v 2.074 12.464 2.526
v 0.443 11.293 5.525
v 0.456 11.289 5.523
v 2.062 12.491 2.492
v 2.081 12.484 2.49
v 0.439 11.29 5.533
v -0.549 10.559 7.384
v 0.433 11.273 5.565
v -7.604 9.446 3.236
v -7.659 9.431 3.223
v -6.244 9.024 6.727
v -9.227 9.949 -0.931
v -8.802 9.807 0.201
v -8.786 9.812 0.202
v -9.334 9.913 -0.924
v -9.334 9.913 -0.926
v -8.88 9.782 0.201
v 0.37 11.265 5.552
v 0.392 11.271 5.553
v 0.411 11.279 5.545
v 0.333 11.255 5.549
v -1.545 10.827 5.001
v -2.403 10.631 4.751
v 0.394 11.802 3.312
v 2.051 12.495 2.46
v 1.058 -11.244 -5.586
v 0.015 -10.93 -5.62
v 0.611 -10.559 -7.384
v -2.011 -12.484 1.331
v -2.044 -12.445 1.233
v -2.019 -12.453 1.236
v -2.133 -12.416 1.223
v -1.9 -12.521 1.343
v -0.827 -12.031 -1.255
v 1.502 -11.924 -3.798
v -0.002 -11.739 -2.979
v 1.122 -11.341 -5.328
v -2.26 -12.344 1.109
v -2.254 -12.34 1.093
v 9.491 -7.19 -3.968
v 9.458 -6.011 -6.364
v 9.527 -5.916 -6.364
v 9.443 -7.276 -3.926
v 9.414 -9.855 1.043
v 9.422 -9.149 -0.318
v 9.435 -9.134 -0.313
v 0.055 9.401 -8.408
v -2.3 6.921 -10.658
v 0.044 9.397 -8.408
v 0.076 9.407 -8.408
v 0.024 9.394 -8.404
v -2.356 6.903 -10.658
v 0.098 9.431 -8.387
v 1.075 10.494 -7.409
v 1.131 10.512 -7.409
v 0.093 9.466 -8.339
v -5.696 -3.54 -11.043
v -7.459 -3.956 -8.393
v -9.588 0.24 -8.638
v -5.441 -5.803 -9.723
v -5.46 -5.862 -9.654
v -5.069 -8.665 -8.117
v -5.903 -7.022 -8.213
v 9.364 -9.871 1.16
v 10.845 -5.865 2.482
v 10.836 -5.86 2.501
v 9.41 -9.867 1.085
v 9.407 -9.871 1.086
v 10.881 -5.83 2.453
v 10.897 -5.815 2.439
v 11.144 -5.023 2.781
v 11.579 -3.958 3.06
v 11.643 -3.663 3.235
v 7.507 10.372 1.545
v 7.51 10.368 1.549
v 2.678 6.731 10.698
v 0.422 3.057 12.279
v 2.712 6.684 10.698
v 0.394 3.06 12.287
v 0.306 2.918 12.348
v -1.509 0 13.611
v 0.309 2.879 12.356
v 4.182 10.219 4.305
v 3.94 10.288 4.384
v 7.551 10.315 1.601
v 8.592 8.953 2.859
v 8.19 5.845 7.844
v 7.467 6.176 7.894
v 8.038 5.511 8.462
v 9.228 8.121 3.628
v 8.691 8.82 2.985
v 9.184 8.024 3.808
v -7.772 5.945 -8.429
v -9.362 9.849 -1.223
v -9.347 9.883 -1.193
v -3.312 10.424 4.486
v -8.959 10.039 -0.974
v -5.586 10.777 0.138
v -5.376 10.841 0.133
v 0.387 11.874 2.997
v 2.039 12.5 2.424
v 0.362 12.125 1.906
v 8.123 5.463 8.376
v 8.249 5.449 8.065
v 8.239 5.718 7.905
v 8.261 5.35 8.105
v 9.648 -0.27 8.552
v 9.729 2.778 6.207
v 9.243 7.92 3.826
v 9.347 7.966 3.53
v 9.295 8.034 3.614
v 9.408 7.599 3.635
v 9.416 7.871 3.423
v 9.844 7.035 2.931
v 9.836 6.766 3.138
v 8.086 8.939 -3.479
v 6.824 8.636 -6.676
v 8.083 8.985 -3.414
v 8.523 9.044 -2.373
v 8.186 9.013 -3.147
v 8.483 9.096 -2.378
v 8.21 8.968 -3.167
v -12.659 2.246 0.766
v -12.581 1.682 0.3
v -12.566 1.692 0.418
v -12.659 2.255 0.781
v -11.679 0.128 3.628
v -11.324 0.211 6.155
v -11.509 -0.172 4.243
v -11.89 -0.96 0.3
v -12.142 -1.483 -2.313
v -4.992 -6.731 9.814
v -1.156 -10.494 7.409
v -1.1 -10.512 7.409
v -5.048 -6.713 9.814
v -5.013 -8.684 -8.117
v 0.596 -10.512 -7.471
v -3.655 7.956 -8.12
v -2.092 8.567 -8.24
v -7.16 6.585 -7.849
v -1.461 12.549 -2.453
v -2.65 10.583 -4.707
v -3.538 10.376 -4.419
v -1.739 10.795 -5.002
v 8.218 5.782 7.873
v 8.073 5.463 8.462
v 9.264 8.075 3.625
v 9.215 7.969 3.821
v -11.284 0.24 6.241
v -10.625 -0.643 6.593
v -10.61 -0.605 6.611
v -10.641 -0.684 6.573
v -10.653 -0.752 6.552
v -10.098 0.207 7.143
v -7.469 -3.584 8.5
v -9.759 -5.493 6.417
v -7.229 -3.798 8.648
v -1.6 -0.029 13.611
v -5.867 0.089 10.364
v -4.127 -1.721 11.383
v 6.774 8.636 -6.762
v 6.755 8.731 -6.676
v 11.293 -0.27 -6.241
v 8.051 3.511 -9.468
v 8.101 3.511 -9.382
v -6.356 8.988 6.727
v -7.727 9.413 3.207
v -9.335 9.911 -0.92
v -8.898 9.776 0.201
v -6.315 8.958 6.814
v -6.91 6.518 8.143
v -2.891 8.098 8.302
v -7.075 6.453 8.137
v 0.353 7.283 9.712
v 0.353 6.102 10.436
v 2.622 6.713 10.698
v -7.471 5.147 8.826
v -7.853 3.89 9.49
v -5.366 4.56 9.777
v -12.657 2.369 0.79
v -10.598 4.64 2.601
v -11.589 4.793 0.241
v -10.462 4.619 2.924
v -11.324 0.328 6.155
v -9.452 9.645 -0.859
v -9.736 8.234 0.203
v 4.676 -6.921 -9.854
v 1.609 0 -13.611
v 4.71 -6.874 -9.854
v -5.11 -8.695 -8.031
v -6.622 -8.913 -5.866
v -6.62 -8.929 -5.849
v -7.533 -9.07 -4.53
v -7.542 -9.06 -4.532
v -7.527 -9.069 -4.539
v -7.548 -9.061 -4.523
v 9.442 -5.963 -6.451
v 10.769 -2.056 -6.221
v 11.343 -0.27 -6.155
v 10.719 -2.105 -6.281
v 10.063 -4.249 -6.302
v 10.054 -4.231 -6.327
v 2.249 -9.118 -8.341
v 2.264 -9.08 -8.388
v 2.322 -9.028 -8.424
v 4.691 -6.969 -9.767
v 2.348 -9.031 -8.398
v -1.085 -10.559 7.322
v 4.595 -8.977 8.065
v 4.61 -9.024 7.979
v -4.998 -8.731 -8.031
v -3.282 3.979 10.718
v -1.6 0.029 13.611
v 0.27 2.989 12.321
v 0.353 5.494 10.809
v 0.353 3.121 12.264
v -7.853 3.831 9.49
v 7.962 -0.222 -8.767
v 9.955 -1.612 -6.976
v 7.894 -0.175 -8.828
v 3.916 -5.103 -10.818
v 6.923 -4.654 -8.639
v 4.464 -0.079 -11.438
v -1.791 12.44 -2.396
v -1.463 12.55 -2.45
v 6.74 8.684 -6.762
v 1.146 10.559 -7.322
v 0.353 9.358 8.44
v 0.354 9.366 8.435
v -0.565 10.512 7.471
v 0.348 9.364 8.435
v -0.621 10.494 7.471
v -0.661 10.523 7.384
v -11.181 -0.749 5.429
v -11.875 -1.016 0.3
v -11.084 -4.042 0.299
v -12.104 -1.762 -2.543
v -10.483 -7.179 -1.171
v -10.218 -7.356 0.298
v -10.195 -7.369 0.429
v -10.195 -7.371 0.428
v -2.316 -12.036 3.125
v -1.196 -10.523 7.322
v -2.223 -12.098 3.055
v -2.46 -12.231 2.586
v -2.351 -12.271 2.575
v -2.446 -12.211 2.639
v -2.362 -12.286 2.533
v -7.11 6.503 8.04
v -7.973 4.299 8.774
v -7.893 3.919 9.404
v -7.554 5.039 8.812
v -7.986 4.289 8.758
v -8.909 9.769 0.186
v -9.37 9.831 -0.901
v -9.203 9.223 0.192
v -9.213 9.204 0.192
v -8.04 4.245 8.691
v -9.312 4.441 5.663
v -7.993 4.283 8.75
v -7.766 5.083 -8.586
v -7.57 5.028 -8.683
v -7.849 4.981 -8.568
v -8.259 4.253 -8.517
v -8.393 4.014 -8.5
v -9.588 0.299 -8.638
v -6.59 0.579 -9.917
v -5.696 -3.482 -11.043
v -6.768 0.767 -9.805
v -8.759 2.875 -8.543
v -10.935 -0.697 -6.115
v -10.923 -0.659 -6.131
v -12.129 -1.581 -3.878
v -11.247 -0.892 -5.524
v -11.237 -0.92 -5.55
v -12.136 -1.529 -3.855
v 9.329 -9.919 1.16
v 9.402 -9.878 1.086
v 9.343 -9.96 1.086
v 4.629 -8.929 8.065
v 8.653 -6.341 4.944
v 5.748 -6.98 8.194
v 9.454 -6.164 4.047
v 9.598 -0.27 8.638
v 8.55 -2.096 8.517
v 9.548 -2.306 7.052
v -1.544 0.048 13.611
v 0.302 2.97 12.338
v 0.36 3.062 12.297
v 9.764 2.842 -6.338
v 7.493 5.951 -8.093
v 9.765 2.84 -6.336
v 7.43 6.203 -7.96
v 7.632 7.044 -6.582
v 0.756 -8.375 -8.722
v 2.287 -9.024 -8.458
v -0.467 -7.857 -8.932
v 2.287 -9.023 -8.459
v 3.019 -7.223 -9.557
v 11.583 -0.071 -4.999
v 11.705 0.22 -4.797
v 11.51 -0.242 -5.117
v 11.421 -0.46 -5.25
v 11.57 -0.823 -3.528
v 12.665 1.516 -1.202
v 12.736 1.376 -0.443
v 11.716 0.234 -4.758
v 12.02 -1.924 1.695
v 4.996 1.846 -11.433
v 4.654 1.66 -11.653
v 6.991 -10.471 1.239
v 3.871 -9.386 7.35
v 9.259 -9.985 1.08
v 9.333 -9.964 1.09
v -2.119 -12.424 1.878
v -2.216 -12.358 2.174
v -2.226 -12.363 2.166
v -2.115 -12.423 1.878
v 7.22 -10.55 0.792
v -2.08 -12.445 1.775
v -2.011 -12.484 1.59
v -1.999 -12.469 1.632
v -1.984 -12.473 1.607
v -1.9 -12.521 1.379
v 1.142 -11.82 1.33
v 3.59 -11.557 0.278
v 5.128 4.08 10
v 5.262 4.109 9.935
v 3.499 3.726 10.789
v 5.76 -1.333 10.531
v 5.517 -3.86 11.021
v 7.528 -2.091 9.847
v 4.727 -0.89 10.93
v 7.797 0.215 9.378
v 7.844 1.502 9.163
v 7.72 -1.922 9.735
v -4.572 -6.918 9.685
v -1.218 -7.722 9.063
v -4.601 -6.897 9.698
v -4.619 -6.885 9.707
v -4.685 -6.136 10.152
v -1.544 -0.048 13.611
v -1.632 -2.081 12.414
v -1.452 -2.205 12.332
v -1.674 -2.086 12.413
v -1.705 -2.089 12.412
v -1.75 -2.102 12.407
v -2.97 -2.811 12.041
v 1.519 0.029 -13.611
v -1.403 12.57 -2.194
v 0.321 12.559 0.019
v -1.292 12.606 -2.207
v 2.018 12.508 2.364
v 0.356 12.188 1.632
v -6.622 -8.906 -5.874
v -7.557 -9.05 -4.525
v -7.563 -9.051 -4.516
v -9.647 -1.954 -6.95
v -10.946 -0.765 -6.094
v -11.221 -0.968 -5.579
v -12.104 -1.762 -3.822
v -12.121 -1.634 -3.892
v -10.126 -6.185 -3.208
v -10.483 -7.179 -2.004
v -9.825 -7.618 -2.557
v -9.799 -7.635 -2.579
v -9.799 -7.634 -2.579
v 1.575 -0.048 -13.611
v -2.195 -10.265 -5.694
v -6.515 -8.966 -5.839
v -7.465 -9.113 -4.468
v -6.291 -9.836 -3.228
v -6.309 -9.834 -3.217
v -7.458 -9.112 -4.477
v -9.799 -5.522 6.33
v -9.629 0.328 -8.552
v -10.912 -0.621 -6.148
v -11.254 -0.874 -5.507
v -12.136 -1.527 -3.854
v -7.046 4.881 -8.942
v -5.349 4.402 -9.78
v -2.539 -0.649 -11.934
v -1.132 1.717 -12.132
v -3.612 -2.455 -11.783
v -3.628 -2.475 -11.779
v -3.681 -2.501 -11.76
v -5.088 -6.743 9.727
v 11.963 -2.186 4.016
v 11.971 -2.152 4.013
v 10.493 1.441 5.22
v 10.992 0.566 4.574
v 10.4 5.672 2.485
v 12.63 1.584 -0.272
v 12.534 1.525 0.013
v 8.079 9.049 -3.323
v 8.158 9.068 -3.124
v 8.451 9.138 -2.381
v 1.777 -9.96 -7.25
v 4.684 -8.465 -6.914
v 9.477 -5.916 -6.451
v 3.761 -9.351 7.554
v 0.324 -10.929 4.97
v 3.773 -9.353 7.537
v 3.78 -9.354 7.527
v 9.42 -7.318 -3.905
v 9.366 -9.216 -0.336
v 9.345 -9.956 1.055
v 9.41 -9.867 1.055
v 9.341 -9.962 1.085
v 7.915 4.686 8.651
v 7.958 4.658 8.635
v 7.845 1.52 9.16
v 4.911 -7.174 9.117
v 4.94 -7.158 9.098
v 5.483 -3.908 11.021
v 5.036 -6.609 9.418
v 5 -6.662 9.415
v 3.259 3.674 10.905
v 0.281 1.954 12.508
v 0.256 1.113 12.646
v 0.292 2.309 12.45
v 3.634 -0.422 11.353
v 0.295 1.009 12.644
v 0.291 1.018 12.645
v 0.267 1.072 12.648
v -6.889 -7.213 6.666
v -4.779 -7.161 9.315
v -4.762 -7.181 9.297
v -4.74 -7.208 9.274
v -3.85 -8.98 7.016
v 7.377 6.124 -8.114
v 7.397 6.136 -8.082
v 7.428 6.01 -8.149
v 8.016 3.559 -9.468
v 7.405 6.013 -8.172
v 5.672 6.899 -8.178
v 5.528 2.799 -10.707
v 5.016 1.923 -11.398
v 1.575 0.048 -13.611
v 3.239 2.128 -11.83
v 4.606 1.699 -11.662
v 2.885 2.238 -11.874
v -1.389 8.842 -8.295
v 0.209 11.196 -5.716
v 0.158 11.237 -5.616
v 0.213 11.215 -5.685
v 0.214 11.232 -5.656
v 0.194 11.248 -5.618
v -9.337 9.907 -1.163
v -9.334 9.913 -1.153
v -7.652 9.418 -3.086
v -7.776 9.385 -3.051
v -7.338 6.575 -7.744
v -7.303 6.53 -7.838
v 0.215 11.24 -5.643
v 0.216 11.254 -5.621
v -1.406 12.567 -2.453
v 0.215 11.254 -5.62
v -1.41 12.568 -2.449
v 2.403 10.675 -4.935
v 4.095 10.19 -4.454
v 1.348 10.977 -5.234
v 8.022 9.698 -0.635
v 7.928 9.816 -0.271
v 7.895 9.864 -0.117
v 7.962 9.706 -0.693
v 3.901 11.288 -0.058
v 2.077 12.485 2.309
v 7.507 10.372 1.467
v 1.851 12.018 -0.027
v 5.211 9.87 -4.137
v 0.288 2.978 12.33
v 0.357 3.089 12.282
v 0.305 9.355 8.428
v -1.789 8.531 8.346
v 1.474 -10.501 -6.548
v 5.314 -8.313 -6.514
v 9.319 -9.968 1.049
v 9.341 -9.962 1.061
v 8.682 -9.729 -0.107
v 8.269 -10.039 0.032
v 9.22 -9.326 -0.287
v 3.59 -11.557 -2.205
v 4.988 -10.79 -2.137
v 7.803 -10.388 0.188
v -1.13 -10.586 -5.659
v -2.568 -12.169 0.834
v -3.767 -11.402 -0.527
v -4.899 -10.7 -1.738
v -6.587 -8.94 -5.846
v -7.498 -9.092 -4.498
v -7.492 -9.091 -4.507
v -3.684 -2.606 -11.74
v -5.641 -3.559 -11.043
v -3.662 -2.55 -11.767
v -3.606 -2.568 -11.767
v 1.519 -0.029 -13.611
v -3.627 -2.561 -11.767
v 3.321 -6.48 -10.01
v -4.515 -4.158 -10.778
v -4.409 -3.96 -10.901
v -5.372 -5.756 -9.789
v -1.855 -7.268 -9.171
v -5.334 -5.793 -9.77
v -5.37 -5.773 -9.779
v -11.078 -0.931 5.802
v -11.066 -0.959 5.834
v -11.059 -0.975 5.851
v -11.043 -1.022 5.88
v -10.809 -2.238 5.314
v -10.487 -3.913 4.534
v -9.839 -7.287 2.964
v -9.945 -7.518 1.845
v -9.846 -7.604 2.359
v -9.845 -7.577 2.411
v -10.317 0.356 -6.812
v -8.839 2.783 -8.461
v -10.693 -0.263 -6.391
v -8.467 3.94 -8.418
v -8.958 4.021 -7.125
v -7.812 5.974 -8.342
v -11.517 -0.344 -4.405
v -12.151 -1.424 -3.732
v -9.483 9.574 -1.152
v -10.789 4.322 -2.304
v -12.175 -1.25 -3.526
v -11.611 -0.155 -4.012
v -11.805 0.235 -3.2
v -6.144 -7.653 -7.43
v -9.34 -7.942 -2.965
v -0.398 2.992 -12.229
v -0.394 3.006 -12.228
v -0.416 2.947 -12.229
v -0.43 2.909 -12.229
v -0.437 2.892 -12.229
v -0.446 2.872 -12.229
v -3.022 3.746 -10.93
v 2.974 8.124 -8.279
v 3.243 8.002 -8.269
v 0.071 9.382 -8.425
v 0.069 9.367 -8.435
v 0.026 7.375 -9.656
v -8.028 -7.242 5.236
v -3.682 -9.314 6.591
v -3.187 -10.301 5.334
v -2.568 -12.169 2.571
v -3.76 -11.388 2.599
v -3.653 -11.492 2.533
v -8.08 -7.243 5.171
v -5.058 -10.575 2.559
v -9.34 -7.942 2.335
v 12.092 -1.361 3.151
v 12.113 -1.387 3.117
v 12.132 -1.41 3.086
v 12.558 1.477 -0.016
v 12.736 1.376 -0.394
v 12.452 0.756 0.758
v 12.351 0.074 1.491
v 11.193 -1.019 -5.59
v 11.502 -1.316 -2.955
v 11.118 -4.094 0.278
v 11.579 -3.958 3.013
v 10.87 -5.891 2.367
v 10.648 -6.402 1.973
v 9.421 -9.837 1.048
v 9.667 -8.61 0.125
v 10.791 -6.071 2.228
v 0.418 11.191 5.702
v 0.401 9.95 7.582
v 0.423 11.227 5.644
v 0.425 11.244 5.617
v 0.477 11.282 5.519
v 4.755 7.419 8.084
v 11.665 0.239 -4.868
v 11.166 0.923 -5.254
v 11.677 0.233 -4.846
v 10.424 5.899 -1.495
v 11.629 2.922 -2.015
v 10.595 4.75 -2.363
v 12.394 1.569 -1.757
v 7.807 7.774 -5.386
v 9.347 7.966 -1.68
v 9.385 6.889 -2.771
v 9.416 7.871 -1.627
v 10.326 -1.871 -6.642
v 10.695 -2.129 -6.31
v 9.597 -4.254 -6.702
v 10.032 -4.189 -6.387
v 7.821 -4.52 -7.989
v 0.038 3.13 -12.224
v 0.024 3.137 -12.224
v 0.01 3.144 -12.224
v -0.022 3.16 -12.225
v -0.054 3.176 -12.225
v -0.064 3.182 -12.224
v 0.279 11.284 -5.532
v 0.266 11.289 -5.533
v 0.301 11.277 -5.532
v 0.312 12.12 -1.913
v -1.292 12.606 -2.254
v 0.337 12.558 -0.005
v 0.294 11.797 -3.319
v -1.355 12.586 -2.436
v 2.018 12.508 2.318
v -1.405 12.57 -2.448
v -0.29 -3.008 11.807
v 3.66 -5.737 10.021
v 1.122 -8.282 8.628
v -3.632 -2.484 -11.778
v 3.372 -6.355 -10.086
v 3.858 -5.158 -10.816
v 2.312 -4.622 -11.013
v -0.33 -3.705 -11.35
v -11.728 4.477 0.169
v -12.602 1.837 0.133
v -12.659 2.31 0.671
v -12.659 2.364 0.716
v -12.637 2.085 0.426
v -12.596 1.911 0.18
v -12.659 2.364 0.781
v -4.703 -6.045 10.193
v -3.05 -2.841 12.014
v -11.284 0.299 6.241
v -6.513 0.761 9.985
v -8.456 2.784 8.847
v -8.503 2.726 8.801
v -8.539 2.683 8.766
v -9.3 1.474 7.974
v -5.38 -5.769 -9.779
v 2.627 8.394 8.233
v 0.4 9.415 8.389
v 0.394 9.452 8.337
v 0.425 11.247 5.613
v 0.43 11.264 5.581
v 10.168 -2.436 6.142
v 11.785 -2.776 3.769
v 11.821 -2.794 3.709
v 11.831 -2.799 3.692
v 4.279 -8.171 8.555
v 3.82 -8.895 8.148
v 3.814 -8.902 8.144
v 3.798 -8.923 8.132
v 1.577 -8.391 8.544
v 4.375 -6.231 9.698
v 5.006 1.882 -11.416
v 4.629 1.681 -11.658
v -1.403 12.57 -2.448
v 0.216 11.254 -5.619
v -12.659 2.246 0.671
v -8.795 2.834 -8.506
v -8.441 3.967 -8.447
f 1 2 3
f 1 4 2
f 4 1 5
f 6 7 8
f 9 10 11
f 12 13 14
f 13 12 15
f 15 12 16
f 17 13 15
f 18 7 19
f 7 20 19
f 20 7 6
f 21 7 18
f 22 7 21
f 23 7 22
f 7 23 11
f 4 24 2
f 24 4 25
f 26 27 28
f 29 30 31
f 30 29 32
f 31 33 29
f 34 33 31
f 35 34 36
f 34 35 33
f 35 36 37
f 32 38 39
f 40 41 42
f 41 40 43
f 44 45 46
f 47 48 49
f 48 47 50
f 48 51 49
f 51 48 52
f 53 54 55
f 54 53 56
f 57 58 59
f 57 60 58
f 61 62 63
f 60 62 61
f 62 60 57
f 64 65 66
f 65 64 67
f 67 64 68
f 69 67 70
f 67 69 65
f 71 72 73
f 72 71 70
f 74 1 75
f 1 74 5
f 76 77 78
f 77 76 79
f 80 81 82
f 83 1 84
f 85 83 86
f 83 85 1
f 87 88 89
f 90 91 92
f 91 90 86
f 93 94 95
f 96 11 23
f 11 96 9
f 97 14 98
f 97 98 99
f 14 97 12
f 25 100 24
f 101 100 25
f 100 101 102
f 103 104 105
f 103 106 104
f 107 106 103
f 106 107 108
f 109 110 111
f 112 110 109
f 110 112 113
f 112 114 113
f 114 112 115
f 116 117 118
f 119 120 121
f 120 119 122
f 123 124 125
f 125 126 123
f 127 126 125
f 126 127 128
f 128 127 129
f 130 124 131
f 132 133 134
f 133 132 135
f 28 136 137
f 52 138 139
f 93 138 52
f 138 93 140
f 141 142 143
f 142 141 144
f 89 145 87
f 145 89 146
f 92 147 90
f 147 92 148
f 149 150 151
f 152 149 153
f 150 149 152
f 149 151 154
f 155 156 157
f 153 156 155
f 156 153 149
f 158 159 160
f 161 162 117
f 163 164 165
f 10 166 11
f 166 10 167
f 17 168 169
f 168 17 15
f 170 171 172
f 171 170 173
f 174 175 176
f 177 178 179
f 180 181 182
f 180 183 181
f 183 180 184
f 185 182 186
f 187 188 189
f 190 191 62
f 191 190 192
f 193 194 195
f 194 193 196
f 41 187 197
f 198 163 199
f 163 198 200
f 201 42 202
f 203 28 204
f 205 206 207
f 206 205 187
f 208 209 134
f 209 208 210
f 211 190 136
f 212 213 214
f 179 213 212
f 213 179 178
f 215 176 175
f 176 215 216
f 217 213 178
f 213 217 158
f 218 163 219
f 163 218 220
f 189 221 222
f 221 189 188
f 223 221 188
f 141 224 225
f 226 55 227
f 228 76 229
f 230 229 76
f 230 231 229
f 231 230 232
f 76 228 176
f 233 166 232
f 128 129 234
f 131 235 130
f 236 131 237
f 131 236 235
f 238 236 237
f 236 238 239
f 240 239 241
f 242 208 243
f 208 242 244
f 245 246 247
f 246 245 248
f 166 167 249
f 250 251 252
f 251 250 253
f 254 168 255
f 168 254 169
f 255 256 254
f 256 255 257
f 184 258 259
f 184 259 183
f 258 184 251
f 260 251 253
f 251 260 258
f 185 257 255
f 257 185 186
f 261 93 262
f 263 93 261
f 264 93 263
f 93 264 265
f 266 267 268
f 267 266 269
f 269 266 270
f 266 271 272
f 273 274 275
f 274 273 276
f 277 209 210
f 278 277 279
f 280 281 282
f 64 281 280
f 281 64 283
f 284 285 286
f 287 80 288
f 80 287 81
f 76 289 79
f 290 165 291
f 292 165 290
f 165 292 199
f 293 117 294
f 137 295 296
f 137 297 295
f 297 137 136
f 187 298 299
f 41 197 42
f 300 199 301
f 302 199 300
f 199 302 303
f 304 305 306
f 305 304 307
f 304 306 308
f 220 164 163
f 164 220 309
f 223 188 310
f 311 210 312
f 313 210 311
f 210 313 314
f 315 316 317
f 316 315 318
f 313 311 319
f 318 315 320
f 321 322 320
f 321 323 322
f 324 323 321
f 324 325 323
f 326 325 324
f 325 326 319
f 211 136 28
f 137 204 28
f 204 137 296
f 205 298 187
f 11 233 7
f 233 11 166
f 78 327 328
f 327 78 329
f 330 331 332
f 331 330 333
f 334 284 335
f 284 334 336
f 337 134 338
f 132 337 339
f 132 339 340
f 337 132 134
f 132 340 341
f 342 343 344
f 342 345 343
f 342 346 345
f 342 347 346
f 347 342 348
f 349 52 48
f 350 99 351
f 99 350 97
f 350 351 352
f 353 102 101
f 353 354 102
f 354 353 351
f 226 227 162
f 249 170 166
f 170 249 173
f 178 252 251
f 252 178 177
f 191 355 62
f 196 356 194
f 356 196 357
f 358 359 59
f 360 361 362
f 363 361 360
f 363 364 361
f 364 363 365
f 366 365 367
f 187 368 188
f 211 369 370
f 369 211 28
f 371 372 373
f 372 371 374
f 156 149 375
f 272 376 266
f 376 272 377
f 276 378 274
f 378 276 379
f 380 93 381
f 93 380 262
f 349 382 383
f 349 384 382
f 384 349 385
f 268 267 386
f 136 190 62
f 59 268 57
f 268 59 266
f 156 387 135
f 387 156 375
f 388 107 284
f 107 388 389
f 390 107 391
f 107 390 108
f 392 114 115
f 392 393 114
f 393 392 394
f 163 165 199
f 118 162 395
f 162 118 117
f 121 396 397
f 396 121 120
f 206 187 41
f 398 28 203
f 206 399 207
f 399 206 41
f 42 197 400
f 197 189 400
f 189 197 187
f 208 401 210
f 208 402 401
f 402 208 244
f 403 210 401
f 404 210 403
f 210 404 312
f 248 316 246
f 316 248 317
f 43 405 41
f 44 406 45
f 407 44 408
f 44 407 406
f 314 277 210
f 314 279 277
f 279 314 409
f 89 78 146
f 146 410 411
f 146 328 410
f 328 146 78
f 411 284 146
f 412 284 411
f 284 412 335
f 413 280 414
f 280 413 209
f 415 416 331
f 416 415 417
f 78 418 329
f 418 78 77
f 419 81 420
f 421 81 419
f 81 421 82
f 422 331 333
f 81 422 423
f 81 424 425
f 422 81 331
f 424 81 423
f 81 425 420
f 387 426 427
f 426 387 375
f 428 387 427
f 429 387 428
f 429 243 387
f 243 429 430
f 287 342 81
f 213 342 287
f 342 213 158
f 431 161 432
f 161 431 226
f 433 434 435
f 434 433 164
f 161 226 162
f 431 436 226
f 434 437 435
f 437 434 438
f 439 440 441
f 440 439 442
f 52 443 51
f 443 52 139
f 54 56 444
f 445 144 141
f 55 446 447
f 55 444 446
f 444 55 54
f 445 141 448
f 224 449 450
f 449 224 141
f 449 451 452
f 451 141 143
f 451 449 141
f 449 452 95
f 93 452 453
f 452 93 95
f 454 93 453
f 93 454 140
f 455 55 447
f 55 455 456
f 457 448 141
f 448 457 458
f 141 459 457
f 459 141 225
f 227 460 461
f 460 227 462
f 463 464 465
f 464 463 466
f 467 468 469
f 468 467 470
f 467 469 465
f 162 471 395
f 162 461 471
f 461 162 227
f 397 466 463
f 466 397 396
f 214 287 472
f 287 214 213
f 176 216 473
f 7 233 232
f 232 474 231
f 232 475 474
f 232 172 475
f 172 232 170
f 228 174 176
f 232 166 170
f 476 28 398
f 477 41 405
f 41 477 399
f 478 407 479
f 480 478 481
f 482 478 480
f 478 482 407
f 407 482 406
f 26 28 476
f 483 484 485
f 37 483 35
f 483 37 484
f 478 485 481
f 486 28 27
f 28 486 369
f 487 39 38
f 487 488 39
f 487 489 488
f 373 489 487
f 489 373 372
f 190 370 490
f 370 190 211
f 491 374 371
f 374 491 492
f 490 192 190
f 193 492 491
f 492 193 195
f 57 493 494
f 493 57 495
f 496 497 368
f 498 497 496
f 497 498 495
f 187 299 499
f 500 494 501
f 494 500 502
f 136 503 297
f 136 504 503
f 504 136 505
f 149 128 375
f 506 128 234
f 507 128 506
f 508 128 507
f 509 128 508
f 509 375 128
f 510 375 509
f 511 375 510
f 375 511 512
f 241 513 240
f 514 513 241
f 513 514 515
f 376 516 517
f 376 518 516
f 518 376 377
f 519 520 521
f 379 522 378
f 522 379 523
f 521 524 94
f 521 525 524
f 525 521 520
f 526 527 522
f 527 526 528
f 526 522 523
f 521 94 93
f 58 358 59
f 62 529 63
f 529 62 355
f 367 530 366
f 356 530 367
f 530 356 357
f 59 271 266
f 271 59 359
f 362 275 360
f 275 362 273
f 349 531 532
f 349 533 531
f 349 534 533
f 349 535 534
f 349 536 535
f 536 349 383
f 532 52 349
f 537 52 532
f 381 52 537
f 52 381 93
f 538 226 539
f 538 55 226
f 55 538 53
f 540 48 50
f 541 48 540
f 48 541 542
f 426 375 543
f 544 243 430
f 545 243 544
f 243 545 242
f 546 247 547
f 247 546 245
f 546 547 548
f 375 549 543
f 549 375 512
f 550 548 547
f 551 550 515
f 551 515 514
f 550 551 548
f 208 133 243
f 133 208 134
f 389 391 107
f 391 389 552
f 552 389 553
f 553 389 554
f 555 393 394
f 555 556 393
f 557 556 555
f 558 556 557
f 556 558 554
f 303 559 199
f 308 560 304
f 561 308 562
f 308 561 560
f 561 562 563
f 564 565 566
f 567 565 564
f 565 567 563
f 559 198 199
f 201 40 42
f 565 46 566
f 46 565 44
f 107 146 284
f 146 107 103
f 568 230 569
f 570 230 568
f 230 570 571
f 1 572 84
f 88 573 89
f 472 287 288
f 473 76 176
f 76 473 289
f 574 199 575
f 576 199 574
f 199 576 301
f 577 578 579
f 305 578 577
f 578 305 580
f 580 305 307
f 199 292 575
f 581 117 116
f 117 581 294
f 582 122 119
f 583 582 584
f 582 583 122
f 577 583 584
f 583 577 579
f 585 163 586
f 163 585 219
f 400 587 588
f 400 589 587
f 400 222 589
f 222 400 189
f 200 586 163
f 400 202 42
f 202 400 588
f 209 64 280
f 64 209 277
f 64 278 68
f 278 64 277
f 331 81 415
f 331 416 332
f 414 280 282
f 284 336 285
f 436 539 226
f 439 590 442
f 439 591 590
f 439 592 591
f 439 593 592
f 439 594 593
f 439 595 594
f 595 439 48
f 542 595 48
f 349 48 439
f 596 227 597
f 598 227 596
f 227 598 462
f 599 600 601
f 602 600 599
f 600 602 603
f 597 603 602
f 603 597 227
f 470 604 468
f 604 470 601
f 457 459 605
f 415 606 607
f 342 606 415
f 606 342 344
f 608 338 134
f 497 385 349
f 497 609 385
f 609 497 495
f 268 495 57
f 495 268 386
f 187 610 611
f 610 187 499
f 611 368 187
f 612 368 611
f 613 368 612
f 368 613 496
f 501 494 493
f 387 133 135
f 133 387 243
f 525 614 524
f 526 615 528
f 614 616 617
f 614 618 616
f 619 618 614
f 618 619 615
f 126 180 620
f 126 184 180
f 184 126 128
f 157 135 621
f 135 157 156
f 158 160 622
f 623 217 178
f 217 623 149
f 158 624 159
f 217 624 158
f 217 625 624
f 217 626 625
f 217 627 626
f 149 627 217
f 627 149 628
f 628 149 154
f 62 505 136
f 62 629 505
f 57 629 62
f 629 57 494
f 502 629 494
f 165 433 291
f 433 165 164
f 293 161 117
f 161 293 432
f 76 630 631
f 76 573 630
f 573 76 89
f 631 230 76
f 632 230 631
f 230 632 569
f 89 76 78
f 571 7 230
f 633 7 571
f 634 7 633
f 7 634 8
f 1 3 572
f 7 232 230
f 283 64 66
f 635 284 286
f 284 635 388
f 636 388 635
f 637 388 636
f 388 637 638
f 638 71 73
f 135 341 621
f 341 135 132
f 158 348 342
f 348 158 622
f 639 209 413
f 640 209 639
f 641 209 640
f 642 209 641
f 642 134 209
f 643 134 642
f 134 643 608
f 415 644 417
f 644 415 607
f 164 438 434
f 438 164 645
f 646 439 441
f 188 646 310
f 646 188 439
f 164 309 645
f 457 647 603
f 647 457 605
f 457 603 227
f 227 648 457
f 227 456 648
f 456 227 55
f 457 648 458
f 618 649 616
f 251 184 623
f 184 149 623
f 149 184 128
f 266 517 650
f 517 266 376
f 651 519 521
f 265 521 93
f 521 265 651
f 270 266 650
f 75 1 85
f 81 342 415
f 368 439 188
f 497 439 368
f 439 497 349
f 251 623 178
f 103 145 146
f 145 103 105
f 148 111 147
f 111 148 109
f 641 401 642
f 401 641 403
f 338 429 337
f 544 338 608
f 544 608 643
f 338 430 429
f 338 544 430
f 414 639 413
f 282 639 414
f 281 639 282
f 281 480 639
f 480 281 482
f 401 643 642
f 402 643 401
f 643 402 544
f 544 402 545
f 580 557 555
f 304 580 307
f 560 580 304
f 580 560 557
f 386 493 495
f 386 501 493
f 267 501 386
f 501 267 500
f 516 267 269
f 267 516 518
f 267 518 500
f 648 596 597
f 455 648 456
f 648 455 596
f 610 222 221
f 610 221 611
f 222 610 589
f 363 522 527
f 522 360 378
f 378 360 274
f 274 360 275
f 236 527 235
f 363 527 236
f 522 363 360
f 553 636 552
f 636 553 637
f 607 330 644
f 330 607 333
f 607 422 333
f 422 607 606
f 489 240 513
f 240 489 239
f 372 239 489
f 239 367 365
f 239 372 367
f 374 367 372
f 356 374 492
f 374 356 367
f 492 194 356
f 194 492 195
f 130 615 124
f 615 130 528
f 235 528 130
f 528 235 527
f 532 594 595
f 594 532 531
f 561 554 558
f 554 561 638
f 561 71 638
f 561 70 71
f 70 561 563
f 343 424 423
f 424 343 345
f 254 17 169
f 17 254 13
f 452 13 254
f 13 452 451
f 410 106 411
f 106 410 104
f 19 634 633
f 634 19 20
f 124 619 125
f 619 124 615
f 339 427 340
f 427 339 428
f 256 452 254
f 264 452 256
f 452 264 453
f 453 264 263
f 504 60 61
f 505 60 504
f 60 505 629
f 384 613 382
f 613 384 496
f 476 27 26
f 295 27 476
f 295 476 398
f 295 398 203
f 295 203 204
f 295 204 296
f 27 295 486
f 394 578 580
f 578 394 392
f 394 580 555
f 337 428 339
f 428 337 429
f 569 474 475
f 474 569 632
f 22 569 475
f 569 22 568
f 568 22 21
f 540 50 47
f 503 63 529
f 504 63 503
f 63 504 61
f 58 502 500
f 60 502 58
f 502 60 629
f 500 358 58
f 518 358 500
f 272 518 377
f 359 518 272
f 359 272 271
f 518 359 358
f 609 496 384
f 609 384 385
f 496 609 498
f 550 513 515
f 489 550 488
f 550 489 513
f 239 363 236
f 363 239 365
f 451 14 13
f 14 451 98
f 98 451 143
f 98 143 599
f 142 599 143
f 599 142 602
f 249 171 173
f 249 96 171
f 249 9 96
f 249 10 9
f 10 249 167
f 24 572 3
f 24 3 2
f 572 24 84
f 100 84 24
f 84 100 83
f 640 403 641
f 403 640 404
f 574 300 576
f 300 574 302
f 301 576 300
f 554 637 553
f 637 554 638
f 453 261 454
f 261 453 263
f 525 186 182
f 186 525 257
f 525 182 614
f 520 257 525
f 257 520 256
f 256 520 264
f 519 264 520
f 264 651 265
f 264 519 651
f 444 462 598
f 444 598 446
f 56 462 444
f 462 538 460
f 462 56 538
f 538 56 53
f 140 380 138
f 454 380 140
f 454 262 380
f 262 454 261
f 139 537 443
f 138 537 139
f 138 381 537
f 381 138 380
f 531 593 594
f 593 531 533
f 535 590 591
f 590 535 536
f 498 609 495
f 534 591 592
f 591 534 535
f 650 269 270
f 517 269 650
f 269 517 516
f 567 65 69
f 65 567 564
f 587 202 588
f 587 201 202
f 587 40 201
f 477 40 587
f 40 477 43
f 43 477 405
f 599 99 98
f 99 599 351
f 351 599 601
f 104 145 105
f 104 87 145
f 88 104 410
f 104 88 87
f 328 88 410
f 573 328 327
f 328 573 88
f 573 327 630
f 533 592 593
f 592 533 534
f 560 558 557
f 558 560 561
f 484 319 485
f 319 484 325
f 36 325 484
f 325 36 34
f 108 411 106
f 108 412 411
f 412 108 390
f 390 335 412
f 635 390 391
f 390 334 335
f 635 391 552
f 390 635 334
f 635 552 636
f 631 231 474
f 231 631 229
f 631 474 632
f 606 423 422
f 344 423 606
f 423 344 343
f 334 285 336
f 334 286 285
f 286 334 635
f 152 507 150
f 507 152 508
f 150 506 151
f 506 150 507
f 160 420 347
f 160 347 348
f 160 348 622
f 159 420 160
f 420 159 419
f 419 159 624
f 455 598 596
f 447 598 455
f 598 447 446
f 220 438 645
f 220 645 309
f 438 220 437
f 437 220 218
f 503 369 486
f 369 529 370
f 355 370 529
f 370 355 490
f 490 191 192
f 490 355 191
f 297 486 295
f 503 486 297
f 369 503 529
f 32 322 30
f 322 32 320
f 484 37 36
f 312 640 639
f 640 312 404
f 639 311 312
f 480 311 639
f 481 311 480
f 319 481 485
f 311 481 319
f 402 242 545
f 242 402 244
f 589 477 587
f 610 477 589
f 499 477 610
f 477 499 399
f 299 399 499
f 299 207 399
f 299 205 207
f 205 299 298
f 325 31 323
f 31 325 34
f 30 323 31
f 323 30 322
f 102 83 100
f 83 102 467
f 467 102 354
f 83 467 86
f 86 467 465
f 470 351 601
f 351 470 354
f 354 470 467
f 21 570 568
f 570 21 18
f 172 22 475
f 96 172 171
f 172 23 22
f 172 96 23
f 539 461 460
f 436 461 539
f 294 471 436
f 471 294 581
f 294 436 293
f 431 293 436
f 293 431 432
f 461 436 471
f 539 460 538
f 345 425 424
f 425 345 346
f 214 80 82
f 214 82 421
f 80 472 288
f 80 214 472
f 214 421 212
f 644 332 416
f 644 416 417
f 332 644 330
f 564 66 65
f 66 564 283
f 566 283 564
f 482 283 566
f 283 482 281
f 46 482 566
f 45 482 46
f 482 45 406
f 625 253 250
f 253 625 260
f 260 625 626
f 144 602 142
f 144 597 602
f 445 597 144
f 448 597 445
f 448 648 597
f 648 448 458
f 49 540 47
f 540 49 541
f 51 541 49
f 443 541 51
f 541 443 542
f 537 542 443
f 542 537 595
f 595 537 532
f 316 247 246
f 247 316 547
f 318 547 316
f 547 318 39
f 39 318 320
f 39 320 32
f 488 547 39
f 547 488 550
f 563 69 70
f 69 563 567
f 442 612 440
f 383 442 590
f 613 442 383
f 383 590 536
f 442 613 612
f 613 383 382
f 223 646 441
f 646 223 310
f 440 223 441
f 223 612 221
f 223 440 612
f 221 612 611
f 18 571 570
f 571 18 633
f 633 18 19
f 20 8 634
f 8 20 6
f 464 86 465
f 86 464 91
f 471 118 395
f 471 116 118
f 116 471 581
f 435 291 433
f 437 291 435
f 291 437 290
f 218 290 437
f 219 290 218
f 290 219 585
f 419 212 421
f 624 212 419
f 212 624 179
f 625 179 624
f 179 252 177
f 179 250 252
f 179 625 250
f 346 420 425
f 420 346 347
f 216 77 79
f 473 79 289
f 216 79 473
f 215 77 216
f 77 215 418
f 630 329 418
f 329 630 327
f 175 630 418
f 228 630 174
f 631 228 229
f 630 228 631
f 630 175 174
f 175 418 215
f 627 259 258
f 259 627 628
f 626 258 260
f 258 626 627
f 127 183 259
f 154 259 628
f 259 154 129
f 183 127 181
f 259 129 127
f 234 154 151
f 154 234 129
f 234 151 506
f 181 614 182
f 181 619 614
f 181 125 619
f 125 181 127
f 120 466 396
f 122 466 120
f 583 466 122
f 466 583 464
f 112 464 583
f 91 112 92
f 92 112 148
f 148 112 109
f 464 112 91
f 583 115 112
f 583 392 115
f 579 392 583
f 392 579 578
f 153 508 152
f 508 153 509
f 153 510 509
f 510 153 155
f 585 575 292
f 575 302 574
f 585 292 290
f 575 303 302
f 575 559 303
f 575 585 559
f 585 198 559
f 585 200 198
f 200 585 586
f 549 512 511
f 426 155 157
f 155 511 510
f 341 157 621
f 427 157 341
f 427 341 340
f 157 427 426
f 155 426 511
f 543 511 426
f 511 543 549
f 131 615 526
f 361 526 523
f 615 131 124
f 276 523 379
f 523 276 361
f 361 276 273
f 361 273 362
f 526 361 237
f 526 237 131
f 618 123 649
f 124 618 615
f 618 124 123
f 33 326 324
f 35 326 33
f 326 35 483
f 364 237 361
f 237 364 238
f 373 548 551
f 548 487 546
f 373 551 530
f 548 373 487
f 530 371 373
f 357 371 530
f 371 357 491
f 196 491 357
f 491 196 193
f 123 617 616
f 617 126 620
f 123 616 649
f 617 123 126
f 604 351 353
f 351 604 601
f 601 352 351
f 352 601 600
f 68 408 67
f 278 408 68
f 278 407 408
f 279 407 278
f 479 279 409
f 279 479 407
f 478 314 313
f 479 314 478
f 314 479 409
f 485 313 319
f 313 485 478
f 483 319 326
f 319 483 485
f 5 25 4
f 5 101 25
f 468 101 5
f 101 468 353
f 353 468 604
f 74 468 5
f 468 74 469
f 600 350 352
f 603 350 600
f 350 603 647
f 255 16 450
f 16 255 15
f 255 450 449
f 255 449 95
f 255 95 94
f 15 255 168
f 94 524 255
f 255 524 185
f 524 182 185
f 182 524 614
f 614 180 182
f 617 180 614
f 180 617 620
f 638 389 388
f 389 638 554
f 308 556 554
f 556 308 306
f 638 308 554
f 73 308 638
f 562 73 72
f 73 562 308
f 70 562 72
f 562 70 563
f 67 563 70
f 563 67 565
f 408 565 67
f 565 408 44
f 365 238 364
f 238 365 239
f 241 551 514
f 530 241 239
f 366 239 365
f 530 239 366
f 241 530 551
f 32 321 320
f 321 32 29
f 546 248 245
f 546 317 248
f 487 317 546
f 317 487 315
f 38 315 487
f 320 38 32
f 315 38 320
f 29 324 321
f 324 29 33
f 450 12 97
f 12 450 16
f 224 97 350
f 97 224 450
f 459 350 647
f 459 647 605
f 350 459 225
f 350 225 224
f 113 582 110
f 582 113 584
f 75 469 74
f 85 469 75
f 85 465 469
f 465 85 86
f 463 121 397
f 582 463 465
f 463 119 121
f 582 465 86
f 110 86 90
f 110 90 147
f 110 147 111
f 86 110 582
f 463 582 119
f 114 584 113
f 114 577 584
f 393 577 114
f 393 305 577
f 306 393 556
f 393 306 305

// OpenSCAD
// Auto-generated OpenSCAD file

    inner_points = 10*[[-0.9259432948547036, -0.7883300602910023, -0.6085238006475006], [0.9316330676551551, 0.7870922959996037, 0.6085238006475006], [0.36250103816029455, 0.5098673631148262, -1.209747431354714], [-0.3568112653598431, -0.5111051274062247, 1.209747431354714], [-0.925291724573977, 0.9854604731767459, 0.1401696762662029], [0.9309814973744285, -0.9866982374681444, -0.1401696762662029], [-0.35081411083503256, -0.4738360437094516, -1.1378078680695332], [0.7475860797536108, 1.0276898047752139, -0.17764490505050634], [-1.0402239996615512, -0.7119755434462155, 0.2226991520371504], [0.6548315763438759, 0.1556462537976566, 1.0927536210828892], [0.6286226019814043, -0.27949594840127423, -1.0836262019550489], [-0.08207562869002864, 1.0459363126489396, -0.7356131070950278], [-0.9214699538373878, 0.02506694532226054, 0.8880305328921074], [0.38630252614691507, -0.7939828381527229, 0.9312087761579693], [0.2535484845565542, -1.0882885695557658, -0.6306649426800235], [-0.13225569744300514, 1.2511346070530849, 0.24182007255132357], [-1.2578025702892264, 0.23051097979970356, -0.031030466067315354], [1.1478893287765803, -0.3958325458798192, 0.41987533619601525], [-1.142335225755677, 0.02525661844782449, -0.5757680801820015], [1.2636280128692259, 0.13758941904949432, 0.18692321005330162], [-0.24870288474090674, -1.2110682056034914, -0.3393406358503813], [0.1387896432282606, 1.0457466395233759, 0.7281855059790813], [-0.3808622889750699, 0.11342628220169892, -1.2179402354053859], [0.9274092622664456, 0.6530140820459664, -0.6012990736446909], [-0.6233917967576023, -0.9712038719577615, 0.5562448266580469], [0.08822436906712942, 0.20228797912729915, 1.2629944823920298], [-0.6487565981352699, 0.8917729367111666, -0.6501294178494864], [1.0455285670538481, -0.3379191756454047, -0.6653233552705532], [0.35590924627928633, -1.1462019397901804, 0.4545337487865449], [-0.7413016695969616, 0.5898726501416215, 0.8609190243334948], [-0.8112036224712066, 0.38477747893184816, -0.9123653780351495], [0.19874023606191676, 1.2413173043965122, -0.2506699692878106], [0.19803173285666142, -0.6874635433307503, -1.064782803832229], [1.207975591389785, 0.16907628213391382, -0.40308739508489017], [-1.2022858185893335, -0.1703140464253123, 0.40308739508489017], [-0.19234196005620996, 0.6862257790393518, 1.064782803832229], [-0.1930504632614653, -1.2425550686879105, 0.2506699692878106], [0.816893395271658, -0.3860152432232466, 0.9123653780351495]];

    outer_points = 10*[[0.9806319976418787, 0.937557877434195, 0.11306508493060516], [-0.9806319976418787, -0.937557877434195, -0.11306508493060516], [0.15593506052222017, 0.0, -1.352450316524903], [-0.15593506052222017, 0.0, 1.352450316524903], [0.931387536887417, -0.9871285773542707, 0.10738728821282113], [-0.931387536887417, 0.9871285773542707, -0.10738728821282113], [0.6724396256707068, 0.8636025894510981, -0.667556312445652], [-0.5028792674718967, -0.8636025894510981, -0.8030684421673696], [0.8022518938844309, 0.5463133160762306, 0.8375855612422387], [-0.971812252083241, -0.5463133160762306, 0.6330391933707828], [-0.2315356867889511, 0.6873689302788506, -1.057133431689357], [0.4660335533754072, -0.6873689302788506, -0.9767049676235087], [0.5467367873526419, -0.38601299296490404, 1.093475545031725], [-0.781234653939098, 0.38601299296490404, 0.9403628542811406], [-0.1420987476759442, 1.2519705115012292, -0.23662987386447693], [0.1922204067807485, -1.2519705115012292, -0.19808348369622714], [1.208416432900287, -0.23249067805347678, 0.3595743626562099], [-1.2585380920050915, 0.23249067805347678, 0.07513899490449419], [1.2687917596939955, 0.168266991141787, -0.07395676567795051], [-1.2186701005891911, -0.168266991141787, -0.36075659188275355], [0.20589975986114212, 1.2416489143855416, 0.24398601447453722], [-0.25602141896594643, -1.2416489143855416, 0.19072734308616685], [0.8000940891116665, 0.3510952800364424, -0.9381883957231318], [-0.5655962225252104, -0.3510952800364424, -1.0956500035897339], [0.2662235961126765, 0.66838455341131, 1.0611328845148649], [-0.5007214626991326, -0.66838455341131, 0.9727055147980009], [0.9426991492217683, -0.5915526261203796, -0.6363958811553354], [-0.7731387910229582, 0.5915526261203796, -0.8342288734576861], [-0.6274980486580776, 0.8929085634343263, 0.6727379944977034], [0.45793769045926747, -0.8929085634343263, 0.7978867601153181], [1.1243241920756009, -0.026951044898001153, -0.6154548442065362], [0.05800650685125809, -1.0464308783457534, -0.7383993329982691], [0.11155385134755201, 1.0464308783457534, -0.7322254216147525], [-0.9547638338767909, 0.026951044898001153, -0.8551699104064854], [0.9547638338767909, -0.026951044898001153, 0.8551699104064854], [-0.11155385134755201, -1.0464308783457534, 0.7322254216147525], [-0.05800650685125809, 1.0464308783457534, 0.7383993329982691], [-1.1243241920756009, 0.026951044898001153, 0.6154548442065362]];

    // Convex hull for inner set (I)
    module inner_hull() {
        hull() {
            for (p = inner_points) {
                translate(p) sphere(r=0.1);
            }
        }
    }

    // Convex hull for outer set (O) minus inner hull (O \ I)
    module outer_minus_inner() {
        difference() {
            hull() {
                for (p = outer_points) {
                    translate(p) sphere(r=0.1);
                }
            }
            inner_hull(); // Subtract inner hull
        }
    }

    // Convex hull for outer set (O) minus all translated inner hulls
    module outer_minus_AllTranslationInner() {
        difference() {
            hull() {
                for (p = outer_points) {
                    translate(p) sphere(r=0.1);
                }
            }
            hull() {
                translate([0,0,50]) inner_hull();
                translate([0,0,-50]) inner_hull();
            }; // Subtract translated inner hulls
        }
    }

    // Difference between outer_minus_inner and outer_minus_AllTranslationInner
    module outer_minus_inner_diff() {
        difference() {
            // Outer minus inner
            difference() {
                hull() {
                    for (p = outer_points) {
                        translate(p) sphere(r=0.1);
                    }
                }
                inner_hull();
            }

            // Subtract Outer minus AllTranslationInner
            difference() {
                hull() {
                    for (p = outer_points) {
                        translate(p) sphere(r=0.1);
                    }
                }
                hull() {
                    translate([0,0,50]) inner_hull();
                    translate([0,0,-50]) inner_hull();
                };
            }
        }
    }

    // Rendering all with colors applied
    // color([1, 0, 0, 0.5]) inner_hull(); // Transparent red
    // color([0, 0, 1, 1]) outer_minus_inner(); // Opaque blue
    color([1, 1, 0, 1]) outer_minus_inner_diff(); // Opaque yellow
    
